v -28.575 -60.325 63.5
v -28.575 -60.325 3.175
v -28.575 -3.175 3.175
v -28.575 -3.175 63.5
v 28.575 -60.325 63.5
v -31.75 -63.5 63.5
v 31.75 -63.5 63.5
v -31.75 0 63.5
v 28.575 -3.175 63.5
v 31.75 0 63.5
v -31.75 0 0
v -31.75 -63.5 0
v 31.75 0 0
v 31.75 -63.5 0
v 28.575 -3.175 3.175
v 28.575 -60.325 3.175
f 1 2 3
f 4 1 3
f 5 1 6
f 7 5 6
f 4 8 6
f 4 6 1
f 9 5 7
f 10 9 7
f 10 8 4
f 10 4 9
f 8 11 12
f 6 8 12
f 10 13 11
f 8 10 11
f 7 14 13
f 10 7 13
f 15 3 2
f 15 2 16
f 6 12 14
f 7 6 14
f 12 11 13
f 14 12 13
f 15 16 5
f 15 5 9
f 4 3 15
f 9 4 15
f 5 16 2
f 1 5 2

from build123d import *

# Parameters (mm, degrees)
F0_W     = 57.15
F0_H     = 57.15
F1_DEPTH = 3.175
F2_DEPTH = 63.5
F0_W_2   = 3.175
F0_H_2   = 3.175
F3_DEPTH = 63.5
F4_DEPTH = 63.5
F5_DEPTH = 63.5


with BuildPart() as f1:
    # F0 (on Top) → F1 (new body)
    with BuildSketch(Plane.XY):
        with Locations((0, -31.75)):
            Rectangle(F0_W, F0_H)
    extrude(amount=F1_DEPTH)

    # F0 (on Top) → F2 (join)
    with BuildSketch(Plane.XY):
        Polygon((31.75, 0), (-31.75, 0), (-31.75, -3.175), (-28.575, -3.175), (28.575, -3.175), (31.75, -3.175), align=None)
    extrude(amount=F2_DEPTH)

    # F0 (on Top) → F3 (join)
    with BuildSketch(Plane.XY):
        with Locations((-30.1625, -31.75)):
            Rectangle(F0_W_2, F0_H)
        with Locations((-30.1625, -61.9125)):
            Rectangle(F0_W_2, F0_H_2)
    extrude(amount=F3_DEPTH)

    # F0 (on Top) → F4 (join)
    with BuildSketch(Plane.XY):
        Polygon((31.75, -63.5), (31.75, -60.325), (28.575, -60.325), (-28.575, -60.325), (-28.575, -63.5), align=None)
    extrude(amount=F4_DEPTH)

    # F0 (on Top) → F5 (join)
    with BuildSketch(Plane.XY):
        with Locations((30.1625, -31.75)):
            Rectangle(F0_W_2, F0_H)
    extrude(amount=F5_DEPTH)


solid = f1.part
